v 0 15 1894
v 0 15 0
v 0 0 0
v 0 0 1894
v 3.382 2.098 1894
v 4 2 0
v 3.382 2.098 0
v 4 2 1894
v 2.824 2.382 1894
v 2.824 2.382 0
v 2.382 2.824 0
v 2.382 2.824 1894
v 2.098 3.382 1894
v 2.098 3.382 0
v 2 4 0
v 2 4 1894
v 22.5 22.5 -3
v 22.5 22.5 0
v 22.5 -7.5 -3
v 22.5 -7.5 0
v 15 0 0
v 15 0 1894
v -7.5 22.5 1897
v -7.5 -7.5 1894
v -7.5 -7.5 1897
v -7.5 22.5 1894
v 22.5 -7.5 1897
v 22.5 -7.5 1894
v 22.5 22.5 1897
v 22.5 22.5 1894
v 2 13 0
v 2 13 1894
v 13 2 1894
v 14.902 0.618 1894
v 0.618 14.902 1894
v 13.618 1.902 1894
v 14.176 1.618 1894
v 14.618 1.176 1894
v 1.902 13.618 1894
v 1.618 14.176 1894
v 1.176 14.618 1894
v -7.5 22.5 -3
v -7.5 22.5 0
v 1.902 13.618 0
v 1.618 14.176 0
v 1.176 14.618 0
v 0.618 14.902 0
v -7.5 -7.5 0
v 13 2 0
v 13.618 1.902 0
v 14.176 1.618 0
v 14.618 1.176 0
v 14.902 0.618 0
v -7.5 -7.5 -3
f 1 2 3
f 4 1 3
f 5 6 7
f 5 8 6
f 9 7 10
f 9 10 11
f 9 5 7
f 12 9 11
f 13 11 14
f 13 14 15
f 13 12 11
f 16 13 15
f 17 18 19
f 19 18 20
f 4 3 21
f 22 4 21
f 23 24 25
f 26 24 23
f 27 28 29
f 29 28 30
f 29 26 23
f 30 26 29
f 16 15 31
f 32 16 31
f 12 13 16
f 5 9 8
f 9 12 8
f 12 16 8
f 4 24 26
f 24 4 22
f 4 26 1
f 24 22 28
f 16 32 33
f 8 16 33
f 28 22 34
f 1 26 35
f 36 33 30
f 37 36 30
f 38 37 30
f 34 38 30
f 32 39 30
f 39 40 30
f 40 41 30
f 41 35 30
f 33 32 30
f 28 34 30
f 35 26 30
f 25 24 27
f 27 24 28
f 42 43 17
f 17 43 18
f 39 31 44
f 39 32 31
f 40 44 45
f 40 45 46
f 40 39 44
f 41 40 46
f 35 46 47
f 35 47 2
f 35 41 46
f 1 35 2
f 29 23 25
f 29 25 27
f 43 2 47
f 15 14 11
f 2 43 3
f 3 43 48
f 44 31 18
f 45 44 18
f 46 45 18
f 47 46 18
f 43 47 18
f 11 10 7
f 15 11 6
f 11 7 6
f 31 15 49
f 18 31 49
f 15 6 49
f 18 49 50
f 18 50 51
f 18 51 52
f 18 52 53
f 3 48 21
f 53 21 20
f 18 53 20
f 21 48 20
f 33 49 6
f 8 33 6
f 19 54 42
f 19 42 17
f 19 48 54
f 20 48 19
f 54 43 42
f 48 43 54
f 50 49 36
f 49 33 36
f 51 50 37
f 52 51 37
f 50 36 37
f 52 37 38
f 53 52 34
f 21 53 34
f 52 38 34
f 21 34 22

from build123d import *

# Parameters (mm, degrees)
F1_DEPTH = 1894
F2_R     = 2
F3_R     = 1.99999
F4_W     = 30
F4_H     = 30
F5_DEPTH = 3
F6_W     = 30
F6_H     = 30
F7_DEPTH = 3


# Not quite as in the source:
# - a fillet or chamfer is up to 0.001 mm smaller than in the source, because OpenCascade refuses the exact size


with BuildPart() as f1:
    # F0 (on Top) → F1 (new body)
    with BuildSketch(Plane.XY):
        Polygon((0, 15), (0, 0), (15, 0), (15, 2), (2, 2), (2, 15), align=None)
    extrude(amount=F1_DEPTH)

    # F2
    f2_edges = [f1.edges().sort_by_distance(p)[0] for p in [
        (2, 2, 947),
    ]]
    fillet(f2_edges, radius=F2_R)

    # F3 (radius 2 in the source; OpenCascade refuses exactly that, so slightly less here)
    f3_edges = [f1.edges().sort_by_distance(p)[0] for p in [
        (2, 15, 947),
        (15, 2, 947),
    ]]
    fillet(f3_edges, radius=F3_R)

    # F4 (on face) → F5 (join)
    with BuildSketch(Plane.XY.offset(1894)):
        with Locations((7.5, 7.5)):
            Rectangle(F4_W, F4_H)
    extrude(amount=F5_DEPTH)

    # F6 (on face) → F7 (join)
    with BuildSketch(Plane(origin=(0, 0, 0), x_dir=(1, 0, 0), z_dir=(0, 0, -1))):
        with Locations((7.5, -7.5)):
            Rectangle(F6_W, F6_H)
    extrude(amount=F7_DEPTH)


solid = f1.part
